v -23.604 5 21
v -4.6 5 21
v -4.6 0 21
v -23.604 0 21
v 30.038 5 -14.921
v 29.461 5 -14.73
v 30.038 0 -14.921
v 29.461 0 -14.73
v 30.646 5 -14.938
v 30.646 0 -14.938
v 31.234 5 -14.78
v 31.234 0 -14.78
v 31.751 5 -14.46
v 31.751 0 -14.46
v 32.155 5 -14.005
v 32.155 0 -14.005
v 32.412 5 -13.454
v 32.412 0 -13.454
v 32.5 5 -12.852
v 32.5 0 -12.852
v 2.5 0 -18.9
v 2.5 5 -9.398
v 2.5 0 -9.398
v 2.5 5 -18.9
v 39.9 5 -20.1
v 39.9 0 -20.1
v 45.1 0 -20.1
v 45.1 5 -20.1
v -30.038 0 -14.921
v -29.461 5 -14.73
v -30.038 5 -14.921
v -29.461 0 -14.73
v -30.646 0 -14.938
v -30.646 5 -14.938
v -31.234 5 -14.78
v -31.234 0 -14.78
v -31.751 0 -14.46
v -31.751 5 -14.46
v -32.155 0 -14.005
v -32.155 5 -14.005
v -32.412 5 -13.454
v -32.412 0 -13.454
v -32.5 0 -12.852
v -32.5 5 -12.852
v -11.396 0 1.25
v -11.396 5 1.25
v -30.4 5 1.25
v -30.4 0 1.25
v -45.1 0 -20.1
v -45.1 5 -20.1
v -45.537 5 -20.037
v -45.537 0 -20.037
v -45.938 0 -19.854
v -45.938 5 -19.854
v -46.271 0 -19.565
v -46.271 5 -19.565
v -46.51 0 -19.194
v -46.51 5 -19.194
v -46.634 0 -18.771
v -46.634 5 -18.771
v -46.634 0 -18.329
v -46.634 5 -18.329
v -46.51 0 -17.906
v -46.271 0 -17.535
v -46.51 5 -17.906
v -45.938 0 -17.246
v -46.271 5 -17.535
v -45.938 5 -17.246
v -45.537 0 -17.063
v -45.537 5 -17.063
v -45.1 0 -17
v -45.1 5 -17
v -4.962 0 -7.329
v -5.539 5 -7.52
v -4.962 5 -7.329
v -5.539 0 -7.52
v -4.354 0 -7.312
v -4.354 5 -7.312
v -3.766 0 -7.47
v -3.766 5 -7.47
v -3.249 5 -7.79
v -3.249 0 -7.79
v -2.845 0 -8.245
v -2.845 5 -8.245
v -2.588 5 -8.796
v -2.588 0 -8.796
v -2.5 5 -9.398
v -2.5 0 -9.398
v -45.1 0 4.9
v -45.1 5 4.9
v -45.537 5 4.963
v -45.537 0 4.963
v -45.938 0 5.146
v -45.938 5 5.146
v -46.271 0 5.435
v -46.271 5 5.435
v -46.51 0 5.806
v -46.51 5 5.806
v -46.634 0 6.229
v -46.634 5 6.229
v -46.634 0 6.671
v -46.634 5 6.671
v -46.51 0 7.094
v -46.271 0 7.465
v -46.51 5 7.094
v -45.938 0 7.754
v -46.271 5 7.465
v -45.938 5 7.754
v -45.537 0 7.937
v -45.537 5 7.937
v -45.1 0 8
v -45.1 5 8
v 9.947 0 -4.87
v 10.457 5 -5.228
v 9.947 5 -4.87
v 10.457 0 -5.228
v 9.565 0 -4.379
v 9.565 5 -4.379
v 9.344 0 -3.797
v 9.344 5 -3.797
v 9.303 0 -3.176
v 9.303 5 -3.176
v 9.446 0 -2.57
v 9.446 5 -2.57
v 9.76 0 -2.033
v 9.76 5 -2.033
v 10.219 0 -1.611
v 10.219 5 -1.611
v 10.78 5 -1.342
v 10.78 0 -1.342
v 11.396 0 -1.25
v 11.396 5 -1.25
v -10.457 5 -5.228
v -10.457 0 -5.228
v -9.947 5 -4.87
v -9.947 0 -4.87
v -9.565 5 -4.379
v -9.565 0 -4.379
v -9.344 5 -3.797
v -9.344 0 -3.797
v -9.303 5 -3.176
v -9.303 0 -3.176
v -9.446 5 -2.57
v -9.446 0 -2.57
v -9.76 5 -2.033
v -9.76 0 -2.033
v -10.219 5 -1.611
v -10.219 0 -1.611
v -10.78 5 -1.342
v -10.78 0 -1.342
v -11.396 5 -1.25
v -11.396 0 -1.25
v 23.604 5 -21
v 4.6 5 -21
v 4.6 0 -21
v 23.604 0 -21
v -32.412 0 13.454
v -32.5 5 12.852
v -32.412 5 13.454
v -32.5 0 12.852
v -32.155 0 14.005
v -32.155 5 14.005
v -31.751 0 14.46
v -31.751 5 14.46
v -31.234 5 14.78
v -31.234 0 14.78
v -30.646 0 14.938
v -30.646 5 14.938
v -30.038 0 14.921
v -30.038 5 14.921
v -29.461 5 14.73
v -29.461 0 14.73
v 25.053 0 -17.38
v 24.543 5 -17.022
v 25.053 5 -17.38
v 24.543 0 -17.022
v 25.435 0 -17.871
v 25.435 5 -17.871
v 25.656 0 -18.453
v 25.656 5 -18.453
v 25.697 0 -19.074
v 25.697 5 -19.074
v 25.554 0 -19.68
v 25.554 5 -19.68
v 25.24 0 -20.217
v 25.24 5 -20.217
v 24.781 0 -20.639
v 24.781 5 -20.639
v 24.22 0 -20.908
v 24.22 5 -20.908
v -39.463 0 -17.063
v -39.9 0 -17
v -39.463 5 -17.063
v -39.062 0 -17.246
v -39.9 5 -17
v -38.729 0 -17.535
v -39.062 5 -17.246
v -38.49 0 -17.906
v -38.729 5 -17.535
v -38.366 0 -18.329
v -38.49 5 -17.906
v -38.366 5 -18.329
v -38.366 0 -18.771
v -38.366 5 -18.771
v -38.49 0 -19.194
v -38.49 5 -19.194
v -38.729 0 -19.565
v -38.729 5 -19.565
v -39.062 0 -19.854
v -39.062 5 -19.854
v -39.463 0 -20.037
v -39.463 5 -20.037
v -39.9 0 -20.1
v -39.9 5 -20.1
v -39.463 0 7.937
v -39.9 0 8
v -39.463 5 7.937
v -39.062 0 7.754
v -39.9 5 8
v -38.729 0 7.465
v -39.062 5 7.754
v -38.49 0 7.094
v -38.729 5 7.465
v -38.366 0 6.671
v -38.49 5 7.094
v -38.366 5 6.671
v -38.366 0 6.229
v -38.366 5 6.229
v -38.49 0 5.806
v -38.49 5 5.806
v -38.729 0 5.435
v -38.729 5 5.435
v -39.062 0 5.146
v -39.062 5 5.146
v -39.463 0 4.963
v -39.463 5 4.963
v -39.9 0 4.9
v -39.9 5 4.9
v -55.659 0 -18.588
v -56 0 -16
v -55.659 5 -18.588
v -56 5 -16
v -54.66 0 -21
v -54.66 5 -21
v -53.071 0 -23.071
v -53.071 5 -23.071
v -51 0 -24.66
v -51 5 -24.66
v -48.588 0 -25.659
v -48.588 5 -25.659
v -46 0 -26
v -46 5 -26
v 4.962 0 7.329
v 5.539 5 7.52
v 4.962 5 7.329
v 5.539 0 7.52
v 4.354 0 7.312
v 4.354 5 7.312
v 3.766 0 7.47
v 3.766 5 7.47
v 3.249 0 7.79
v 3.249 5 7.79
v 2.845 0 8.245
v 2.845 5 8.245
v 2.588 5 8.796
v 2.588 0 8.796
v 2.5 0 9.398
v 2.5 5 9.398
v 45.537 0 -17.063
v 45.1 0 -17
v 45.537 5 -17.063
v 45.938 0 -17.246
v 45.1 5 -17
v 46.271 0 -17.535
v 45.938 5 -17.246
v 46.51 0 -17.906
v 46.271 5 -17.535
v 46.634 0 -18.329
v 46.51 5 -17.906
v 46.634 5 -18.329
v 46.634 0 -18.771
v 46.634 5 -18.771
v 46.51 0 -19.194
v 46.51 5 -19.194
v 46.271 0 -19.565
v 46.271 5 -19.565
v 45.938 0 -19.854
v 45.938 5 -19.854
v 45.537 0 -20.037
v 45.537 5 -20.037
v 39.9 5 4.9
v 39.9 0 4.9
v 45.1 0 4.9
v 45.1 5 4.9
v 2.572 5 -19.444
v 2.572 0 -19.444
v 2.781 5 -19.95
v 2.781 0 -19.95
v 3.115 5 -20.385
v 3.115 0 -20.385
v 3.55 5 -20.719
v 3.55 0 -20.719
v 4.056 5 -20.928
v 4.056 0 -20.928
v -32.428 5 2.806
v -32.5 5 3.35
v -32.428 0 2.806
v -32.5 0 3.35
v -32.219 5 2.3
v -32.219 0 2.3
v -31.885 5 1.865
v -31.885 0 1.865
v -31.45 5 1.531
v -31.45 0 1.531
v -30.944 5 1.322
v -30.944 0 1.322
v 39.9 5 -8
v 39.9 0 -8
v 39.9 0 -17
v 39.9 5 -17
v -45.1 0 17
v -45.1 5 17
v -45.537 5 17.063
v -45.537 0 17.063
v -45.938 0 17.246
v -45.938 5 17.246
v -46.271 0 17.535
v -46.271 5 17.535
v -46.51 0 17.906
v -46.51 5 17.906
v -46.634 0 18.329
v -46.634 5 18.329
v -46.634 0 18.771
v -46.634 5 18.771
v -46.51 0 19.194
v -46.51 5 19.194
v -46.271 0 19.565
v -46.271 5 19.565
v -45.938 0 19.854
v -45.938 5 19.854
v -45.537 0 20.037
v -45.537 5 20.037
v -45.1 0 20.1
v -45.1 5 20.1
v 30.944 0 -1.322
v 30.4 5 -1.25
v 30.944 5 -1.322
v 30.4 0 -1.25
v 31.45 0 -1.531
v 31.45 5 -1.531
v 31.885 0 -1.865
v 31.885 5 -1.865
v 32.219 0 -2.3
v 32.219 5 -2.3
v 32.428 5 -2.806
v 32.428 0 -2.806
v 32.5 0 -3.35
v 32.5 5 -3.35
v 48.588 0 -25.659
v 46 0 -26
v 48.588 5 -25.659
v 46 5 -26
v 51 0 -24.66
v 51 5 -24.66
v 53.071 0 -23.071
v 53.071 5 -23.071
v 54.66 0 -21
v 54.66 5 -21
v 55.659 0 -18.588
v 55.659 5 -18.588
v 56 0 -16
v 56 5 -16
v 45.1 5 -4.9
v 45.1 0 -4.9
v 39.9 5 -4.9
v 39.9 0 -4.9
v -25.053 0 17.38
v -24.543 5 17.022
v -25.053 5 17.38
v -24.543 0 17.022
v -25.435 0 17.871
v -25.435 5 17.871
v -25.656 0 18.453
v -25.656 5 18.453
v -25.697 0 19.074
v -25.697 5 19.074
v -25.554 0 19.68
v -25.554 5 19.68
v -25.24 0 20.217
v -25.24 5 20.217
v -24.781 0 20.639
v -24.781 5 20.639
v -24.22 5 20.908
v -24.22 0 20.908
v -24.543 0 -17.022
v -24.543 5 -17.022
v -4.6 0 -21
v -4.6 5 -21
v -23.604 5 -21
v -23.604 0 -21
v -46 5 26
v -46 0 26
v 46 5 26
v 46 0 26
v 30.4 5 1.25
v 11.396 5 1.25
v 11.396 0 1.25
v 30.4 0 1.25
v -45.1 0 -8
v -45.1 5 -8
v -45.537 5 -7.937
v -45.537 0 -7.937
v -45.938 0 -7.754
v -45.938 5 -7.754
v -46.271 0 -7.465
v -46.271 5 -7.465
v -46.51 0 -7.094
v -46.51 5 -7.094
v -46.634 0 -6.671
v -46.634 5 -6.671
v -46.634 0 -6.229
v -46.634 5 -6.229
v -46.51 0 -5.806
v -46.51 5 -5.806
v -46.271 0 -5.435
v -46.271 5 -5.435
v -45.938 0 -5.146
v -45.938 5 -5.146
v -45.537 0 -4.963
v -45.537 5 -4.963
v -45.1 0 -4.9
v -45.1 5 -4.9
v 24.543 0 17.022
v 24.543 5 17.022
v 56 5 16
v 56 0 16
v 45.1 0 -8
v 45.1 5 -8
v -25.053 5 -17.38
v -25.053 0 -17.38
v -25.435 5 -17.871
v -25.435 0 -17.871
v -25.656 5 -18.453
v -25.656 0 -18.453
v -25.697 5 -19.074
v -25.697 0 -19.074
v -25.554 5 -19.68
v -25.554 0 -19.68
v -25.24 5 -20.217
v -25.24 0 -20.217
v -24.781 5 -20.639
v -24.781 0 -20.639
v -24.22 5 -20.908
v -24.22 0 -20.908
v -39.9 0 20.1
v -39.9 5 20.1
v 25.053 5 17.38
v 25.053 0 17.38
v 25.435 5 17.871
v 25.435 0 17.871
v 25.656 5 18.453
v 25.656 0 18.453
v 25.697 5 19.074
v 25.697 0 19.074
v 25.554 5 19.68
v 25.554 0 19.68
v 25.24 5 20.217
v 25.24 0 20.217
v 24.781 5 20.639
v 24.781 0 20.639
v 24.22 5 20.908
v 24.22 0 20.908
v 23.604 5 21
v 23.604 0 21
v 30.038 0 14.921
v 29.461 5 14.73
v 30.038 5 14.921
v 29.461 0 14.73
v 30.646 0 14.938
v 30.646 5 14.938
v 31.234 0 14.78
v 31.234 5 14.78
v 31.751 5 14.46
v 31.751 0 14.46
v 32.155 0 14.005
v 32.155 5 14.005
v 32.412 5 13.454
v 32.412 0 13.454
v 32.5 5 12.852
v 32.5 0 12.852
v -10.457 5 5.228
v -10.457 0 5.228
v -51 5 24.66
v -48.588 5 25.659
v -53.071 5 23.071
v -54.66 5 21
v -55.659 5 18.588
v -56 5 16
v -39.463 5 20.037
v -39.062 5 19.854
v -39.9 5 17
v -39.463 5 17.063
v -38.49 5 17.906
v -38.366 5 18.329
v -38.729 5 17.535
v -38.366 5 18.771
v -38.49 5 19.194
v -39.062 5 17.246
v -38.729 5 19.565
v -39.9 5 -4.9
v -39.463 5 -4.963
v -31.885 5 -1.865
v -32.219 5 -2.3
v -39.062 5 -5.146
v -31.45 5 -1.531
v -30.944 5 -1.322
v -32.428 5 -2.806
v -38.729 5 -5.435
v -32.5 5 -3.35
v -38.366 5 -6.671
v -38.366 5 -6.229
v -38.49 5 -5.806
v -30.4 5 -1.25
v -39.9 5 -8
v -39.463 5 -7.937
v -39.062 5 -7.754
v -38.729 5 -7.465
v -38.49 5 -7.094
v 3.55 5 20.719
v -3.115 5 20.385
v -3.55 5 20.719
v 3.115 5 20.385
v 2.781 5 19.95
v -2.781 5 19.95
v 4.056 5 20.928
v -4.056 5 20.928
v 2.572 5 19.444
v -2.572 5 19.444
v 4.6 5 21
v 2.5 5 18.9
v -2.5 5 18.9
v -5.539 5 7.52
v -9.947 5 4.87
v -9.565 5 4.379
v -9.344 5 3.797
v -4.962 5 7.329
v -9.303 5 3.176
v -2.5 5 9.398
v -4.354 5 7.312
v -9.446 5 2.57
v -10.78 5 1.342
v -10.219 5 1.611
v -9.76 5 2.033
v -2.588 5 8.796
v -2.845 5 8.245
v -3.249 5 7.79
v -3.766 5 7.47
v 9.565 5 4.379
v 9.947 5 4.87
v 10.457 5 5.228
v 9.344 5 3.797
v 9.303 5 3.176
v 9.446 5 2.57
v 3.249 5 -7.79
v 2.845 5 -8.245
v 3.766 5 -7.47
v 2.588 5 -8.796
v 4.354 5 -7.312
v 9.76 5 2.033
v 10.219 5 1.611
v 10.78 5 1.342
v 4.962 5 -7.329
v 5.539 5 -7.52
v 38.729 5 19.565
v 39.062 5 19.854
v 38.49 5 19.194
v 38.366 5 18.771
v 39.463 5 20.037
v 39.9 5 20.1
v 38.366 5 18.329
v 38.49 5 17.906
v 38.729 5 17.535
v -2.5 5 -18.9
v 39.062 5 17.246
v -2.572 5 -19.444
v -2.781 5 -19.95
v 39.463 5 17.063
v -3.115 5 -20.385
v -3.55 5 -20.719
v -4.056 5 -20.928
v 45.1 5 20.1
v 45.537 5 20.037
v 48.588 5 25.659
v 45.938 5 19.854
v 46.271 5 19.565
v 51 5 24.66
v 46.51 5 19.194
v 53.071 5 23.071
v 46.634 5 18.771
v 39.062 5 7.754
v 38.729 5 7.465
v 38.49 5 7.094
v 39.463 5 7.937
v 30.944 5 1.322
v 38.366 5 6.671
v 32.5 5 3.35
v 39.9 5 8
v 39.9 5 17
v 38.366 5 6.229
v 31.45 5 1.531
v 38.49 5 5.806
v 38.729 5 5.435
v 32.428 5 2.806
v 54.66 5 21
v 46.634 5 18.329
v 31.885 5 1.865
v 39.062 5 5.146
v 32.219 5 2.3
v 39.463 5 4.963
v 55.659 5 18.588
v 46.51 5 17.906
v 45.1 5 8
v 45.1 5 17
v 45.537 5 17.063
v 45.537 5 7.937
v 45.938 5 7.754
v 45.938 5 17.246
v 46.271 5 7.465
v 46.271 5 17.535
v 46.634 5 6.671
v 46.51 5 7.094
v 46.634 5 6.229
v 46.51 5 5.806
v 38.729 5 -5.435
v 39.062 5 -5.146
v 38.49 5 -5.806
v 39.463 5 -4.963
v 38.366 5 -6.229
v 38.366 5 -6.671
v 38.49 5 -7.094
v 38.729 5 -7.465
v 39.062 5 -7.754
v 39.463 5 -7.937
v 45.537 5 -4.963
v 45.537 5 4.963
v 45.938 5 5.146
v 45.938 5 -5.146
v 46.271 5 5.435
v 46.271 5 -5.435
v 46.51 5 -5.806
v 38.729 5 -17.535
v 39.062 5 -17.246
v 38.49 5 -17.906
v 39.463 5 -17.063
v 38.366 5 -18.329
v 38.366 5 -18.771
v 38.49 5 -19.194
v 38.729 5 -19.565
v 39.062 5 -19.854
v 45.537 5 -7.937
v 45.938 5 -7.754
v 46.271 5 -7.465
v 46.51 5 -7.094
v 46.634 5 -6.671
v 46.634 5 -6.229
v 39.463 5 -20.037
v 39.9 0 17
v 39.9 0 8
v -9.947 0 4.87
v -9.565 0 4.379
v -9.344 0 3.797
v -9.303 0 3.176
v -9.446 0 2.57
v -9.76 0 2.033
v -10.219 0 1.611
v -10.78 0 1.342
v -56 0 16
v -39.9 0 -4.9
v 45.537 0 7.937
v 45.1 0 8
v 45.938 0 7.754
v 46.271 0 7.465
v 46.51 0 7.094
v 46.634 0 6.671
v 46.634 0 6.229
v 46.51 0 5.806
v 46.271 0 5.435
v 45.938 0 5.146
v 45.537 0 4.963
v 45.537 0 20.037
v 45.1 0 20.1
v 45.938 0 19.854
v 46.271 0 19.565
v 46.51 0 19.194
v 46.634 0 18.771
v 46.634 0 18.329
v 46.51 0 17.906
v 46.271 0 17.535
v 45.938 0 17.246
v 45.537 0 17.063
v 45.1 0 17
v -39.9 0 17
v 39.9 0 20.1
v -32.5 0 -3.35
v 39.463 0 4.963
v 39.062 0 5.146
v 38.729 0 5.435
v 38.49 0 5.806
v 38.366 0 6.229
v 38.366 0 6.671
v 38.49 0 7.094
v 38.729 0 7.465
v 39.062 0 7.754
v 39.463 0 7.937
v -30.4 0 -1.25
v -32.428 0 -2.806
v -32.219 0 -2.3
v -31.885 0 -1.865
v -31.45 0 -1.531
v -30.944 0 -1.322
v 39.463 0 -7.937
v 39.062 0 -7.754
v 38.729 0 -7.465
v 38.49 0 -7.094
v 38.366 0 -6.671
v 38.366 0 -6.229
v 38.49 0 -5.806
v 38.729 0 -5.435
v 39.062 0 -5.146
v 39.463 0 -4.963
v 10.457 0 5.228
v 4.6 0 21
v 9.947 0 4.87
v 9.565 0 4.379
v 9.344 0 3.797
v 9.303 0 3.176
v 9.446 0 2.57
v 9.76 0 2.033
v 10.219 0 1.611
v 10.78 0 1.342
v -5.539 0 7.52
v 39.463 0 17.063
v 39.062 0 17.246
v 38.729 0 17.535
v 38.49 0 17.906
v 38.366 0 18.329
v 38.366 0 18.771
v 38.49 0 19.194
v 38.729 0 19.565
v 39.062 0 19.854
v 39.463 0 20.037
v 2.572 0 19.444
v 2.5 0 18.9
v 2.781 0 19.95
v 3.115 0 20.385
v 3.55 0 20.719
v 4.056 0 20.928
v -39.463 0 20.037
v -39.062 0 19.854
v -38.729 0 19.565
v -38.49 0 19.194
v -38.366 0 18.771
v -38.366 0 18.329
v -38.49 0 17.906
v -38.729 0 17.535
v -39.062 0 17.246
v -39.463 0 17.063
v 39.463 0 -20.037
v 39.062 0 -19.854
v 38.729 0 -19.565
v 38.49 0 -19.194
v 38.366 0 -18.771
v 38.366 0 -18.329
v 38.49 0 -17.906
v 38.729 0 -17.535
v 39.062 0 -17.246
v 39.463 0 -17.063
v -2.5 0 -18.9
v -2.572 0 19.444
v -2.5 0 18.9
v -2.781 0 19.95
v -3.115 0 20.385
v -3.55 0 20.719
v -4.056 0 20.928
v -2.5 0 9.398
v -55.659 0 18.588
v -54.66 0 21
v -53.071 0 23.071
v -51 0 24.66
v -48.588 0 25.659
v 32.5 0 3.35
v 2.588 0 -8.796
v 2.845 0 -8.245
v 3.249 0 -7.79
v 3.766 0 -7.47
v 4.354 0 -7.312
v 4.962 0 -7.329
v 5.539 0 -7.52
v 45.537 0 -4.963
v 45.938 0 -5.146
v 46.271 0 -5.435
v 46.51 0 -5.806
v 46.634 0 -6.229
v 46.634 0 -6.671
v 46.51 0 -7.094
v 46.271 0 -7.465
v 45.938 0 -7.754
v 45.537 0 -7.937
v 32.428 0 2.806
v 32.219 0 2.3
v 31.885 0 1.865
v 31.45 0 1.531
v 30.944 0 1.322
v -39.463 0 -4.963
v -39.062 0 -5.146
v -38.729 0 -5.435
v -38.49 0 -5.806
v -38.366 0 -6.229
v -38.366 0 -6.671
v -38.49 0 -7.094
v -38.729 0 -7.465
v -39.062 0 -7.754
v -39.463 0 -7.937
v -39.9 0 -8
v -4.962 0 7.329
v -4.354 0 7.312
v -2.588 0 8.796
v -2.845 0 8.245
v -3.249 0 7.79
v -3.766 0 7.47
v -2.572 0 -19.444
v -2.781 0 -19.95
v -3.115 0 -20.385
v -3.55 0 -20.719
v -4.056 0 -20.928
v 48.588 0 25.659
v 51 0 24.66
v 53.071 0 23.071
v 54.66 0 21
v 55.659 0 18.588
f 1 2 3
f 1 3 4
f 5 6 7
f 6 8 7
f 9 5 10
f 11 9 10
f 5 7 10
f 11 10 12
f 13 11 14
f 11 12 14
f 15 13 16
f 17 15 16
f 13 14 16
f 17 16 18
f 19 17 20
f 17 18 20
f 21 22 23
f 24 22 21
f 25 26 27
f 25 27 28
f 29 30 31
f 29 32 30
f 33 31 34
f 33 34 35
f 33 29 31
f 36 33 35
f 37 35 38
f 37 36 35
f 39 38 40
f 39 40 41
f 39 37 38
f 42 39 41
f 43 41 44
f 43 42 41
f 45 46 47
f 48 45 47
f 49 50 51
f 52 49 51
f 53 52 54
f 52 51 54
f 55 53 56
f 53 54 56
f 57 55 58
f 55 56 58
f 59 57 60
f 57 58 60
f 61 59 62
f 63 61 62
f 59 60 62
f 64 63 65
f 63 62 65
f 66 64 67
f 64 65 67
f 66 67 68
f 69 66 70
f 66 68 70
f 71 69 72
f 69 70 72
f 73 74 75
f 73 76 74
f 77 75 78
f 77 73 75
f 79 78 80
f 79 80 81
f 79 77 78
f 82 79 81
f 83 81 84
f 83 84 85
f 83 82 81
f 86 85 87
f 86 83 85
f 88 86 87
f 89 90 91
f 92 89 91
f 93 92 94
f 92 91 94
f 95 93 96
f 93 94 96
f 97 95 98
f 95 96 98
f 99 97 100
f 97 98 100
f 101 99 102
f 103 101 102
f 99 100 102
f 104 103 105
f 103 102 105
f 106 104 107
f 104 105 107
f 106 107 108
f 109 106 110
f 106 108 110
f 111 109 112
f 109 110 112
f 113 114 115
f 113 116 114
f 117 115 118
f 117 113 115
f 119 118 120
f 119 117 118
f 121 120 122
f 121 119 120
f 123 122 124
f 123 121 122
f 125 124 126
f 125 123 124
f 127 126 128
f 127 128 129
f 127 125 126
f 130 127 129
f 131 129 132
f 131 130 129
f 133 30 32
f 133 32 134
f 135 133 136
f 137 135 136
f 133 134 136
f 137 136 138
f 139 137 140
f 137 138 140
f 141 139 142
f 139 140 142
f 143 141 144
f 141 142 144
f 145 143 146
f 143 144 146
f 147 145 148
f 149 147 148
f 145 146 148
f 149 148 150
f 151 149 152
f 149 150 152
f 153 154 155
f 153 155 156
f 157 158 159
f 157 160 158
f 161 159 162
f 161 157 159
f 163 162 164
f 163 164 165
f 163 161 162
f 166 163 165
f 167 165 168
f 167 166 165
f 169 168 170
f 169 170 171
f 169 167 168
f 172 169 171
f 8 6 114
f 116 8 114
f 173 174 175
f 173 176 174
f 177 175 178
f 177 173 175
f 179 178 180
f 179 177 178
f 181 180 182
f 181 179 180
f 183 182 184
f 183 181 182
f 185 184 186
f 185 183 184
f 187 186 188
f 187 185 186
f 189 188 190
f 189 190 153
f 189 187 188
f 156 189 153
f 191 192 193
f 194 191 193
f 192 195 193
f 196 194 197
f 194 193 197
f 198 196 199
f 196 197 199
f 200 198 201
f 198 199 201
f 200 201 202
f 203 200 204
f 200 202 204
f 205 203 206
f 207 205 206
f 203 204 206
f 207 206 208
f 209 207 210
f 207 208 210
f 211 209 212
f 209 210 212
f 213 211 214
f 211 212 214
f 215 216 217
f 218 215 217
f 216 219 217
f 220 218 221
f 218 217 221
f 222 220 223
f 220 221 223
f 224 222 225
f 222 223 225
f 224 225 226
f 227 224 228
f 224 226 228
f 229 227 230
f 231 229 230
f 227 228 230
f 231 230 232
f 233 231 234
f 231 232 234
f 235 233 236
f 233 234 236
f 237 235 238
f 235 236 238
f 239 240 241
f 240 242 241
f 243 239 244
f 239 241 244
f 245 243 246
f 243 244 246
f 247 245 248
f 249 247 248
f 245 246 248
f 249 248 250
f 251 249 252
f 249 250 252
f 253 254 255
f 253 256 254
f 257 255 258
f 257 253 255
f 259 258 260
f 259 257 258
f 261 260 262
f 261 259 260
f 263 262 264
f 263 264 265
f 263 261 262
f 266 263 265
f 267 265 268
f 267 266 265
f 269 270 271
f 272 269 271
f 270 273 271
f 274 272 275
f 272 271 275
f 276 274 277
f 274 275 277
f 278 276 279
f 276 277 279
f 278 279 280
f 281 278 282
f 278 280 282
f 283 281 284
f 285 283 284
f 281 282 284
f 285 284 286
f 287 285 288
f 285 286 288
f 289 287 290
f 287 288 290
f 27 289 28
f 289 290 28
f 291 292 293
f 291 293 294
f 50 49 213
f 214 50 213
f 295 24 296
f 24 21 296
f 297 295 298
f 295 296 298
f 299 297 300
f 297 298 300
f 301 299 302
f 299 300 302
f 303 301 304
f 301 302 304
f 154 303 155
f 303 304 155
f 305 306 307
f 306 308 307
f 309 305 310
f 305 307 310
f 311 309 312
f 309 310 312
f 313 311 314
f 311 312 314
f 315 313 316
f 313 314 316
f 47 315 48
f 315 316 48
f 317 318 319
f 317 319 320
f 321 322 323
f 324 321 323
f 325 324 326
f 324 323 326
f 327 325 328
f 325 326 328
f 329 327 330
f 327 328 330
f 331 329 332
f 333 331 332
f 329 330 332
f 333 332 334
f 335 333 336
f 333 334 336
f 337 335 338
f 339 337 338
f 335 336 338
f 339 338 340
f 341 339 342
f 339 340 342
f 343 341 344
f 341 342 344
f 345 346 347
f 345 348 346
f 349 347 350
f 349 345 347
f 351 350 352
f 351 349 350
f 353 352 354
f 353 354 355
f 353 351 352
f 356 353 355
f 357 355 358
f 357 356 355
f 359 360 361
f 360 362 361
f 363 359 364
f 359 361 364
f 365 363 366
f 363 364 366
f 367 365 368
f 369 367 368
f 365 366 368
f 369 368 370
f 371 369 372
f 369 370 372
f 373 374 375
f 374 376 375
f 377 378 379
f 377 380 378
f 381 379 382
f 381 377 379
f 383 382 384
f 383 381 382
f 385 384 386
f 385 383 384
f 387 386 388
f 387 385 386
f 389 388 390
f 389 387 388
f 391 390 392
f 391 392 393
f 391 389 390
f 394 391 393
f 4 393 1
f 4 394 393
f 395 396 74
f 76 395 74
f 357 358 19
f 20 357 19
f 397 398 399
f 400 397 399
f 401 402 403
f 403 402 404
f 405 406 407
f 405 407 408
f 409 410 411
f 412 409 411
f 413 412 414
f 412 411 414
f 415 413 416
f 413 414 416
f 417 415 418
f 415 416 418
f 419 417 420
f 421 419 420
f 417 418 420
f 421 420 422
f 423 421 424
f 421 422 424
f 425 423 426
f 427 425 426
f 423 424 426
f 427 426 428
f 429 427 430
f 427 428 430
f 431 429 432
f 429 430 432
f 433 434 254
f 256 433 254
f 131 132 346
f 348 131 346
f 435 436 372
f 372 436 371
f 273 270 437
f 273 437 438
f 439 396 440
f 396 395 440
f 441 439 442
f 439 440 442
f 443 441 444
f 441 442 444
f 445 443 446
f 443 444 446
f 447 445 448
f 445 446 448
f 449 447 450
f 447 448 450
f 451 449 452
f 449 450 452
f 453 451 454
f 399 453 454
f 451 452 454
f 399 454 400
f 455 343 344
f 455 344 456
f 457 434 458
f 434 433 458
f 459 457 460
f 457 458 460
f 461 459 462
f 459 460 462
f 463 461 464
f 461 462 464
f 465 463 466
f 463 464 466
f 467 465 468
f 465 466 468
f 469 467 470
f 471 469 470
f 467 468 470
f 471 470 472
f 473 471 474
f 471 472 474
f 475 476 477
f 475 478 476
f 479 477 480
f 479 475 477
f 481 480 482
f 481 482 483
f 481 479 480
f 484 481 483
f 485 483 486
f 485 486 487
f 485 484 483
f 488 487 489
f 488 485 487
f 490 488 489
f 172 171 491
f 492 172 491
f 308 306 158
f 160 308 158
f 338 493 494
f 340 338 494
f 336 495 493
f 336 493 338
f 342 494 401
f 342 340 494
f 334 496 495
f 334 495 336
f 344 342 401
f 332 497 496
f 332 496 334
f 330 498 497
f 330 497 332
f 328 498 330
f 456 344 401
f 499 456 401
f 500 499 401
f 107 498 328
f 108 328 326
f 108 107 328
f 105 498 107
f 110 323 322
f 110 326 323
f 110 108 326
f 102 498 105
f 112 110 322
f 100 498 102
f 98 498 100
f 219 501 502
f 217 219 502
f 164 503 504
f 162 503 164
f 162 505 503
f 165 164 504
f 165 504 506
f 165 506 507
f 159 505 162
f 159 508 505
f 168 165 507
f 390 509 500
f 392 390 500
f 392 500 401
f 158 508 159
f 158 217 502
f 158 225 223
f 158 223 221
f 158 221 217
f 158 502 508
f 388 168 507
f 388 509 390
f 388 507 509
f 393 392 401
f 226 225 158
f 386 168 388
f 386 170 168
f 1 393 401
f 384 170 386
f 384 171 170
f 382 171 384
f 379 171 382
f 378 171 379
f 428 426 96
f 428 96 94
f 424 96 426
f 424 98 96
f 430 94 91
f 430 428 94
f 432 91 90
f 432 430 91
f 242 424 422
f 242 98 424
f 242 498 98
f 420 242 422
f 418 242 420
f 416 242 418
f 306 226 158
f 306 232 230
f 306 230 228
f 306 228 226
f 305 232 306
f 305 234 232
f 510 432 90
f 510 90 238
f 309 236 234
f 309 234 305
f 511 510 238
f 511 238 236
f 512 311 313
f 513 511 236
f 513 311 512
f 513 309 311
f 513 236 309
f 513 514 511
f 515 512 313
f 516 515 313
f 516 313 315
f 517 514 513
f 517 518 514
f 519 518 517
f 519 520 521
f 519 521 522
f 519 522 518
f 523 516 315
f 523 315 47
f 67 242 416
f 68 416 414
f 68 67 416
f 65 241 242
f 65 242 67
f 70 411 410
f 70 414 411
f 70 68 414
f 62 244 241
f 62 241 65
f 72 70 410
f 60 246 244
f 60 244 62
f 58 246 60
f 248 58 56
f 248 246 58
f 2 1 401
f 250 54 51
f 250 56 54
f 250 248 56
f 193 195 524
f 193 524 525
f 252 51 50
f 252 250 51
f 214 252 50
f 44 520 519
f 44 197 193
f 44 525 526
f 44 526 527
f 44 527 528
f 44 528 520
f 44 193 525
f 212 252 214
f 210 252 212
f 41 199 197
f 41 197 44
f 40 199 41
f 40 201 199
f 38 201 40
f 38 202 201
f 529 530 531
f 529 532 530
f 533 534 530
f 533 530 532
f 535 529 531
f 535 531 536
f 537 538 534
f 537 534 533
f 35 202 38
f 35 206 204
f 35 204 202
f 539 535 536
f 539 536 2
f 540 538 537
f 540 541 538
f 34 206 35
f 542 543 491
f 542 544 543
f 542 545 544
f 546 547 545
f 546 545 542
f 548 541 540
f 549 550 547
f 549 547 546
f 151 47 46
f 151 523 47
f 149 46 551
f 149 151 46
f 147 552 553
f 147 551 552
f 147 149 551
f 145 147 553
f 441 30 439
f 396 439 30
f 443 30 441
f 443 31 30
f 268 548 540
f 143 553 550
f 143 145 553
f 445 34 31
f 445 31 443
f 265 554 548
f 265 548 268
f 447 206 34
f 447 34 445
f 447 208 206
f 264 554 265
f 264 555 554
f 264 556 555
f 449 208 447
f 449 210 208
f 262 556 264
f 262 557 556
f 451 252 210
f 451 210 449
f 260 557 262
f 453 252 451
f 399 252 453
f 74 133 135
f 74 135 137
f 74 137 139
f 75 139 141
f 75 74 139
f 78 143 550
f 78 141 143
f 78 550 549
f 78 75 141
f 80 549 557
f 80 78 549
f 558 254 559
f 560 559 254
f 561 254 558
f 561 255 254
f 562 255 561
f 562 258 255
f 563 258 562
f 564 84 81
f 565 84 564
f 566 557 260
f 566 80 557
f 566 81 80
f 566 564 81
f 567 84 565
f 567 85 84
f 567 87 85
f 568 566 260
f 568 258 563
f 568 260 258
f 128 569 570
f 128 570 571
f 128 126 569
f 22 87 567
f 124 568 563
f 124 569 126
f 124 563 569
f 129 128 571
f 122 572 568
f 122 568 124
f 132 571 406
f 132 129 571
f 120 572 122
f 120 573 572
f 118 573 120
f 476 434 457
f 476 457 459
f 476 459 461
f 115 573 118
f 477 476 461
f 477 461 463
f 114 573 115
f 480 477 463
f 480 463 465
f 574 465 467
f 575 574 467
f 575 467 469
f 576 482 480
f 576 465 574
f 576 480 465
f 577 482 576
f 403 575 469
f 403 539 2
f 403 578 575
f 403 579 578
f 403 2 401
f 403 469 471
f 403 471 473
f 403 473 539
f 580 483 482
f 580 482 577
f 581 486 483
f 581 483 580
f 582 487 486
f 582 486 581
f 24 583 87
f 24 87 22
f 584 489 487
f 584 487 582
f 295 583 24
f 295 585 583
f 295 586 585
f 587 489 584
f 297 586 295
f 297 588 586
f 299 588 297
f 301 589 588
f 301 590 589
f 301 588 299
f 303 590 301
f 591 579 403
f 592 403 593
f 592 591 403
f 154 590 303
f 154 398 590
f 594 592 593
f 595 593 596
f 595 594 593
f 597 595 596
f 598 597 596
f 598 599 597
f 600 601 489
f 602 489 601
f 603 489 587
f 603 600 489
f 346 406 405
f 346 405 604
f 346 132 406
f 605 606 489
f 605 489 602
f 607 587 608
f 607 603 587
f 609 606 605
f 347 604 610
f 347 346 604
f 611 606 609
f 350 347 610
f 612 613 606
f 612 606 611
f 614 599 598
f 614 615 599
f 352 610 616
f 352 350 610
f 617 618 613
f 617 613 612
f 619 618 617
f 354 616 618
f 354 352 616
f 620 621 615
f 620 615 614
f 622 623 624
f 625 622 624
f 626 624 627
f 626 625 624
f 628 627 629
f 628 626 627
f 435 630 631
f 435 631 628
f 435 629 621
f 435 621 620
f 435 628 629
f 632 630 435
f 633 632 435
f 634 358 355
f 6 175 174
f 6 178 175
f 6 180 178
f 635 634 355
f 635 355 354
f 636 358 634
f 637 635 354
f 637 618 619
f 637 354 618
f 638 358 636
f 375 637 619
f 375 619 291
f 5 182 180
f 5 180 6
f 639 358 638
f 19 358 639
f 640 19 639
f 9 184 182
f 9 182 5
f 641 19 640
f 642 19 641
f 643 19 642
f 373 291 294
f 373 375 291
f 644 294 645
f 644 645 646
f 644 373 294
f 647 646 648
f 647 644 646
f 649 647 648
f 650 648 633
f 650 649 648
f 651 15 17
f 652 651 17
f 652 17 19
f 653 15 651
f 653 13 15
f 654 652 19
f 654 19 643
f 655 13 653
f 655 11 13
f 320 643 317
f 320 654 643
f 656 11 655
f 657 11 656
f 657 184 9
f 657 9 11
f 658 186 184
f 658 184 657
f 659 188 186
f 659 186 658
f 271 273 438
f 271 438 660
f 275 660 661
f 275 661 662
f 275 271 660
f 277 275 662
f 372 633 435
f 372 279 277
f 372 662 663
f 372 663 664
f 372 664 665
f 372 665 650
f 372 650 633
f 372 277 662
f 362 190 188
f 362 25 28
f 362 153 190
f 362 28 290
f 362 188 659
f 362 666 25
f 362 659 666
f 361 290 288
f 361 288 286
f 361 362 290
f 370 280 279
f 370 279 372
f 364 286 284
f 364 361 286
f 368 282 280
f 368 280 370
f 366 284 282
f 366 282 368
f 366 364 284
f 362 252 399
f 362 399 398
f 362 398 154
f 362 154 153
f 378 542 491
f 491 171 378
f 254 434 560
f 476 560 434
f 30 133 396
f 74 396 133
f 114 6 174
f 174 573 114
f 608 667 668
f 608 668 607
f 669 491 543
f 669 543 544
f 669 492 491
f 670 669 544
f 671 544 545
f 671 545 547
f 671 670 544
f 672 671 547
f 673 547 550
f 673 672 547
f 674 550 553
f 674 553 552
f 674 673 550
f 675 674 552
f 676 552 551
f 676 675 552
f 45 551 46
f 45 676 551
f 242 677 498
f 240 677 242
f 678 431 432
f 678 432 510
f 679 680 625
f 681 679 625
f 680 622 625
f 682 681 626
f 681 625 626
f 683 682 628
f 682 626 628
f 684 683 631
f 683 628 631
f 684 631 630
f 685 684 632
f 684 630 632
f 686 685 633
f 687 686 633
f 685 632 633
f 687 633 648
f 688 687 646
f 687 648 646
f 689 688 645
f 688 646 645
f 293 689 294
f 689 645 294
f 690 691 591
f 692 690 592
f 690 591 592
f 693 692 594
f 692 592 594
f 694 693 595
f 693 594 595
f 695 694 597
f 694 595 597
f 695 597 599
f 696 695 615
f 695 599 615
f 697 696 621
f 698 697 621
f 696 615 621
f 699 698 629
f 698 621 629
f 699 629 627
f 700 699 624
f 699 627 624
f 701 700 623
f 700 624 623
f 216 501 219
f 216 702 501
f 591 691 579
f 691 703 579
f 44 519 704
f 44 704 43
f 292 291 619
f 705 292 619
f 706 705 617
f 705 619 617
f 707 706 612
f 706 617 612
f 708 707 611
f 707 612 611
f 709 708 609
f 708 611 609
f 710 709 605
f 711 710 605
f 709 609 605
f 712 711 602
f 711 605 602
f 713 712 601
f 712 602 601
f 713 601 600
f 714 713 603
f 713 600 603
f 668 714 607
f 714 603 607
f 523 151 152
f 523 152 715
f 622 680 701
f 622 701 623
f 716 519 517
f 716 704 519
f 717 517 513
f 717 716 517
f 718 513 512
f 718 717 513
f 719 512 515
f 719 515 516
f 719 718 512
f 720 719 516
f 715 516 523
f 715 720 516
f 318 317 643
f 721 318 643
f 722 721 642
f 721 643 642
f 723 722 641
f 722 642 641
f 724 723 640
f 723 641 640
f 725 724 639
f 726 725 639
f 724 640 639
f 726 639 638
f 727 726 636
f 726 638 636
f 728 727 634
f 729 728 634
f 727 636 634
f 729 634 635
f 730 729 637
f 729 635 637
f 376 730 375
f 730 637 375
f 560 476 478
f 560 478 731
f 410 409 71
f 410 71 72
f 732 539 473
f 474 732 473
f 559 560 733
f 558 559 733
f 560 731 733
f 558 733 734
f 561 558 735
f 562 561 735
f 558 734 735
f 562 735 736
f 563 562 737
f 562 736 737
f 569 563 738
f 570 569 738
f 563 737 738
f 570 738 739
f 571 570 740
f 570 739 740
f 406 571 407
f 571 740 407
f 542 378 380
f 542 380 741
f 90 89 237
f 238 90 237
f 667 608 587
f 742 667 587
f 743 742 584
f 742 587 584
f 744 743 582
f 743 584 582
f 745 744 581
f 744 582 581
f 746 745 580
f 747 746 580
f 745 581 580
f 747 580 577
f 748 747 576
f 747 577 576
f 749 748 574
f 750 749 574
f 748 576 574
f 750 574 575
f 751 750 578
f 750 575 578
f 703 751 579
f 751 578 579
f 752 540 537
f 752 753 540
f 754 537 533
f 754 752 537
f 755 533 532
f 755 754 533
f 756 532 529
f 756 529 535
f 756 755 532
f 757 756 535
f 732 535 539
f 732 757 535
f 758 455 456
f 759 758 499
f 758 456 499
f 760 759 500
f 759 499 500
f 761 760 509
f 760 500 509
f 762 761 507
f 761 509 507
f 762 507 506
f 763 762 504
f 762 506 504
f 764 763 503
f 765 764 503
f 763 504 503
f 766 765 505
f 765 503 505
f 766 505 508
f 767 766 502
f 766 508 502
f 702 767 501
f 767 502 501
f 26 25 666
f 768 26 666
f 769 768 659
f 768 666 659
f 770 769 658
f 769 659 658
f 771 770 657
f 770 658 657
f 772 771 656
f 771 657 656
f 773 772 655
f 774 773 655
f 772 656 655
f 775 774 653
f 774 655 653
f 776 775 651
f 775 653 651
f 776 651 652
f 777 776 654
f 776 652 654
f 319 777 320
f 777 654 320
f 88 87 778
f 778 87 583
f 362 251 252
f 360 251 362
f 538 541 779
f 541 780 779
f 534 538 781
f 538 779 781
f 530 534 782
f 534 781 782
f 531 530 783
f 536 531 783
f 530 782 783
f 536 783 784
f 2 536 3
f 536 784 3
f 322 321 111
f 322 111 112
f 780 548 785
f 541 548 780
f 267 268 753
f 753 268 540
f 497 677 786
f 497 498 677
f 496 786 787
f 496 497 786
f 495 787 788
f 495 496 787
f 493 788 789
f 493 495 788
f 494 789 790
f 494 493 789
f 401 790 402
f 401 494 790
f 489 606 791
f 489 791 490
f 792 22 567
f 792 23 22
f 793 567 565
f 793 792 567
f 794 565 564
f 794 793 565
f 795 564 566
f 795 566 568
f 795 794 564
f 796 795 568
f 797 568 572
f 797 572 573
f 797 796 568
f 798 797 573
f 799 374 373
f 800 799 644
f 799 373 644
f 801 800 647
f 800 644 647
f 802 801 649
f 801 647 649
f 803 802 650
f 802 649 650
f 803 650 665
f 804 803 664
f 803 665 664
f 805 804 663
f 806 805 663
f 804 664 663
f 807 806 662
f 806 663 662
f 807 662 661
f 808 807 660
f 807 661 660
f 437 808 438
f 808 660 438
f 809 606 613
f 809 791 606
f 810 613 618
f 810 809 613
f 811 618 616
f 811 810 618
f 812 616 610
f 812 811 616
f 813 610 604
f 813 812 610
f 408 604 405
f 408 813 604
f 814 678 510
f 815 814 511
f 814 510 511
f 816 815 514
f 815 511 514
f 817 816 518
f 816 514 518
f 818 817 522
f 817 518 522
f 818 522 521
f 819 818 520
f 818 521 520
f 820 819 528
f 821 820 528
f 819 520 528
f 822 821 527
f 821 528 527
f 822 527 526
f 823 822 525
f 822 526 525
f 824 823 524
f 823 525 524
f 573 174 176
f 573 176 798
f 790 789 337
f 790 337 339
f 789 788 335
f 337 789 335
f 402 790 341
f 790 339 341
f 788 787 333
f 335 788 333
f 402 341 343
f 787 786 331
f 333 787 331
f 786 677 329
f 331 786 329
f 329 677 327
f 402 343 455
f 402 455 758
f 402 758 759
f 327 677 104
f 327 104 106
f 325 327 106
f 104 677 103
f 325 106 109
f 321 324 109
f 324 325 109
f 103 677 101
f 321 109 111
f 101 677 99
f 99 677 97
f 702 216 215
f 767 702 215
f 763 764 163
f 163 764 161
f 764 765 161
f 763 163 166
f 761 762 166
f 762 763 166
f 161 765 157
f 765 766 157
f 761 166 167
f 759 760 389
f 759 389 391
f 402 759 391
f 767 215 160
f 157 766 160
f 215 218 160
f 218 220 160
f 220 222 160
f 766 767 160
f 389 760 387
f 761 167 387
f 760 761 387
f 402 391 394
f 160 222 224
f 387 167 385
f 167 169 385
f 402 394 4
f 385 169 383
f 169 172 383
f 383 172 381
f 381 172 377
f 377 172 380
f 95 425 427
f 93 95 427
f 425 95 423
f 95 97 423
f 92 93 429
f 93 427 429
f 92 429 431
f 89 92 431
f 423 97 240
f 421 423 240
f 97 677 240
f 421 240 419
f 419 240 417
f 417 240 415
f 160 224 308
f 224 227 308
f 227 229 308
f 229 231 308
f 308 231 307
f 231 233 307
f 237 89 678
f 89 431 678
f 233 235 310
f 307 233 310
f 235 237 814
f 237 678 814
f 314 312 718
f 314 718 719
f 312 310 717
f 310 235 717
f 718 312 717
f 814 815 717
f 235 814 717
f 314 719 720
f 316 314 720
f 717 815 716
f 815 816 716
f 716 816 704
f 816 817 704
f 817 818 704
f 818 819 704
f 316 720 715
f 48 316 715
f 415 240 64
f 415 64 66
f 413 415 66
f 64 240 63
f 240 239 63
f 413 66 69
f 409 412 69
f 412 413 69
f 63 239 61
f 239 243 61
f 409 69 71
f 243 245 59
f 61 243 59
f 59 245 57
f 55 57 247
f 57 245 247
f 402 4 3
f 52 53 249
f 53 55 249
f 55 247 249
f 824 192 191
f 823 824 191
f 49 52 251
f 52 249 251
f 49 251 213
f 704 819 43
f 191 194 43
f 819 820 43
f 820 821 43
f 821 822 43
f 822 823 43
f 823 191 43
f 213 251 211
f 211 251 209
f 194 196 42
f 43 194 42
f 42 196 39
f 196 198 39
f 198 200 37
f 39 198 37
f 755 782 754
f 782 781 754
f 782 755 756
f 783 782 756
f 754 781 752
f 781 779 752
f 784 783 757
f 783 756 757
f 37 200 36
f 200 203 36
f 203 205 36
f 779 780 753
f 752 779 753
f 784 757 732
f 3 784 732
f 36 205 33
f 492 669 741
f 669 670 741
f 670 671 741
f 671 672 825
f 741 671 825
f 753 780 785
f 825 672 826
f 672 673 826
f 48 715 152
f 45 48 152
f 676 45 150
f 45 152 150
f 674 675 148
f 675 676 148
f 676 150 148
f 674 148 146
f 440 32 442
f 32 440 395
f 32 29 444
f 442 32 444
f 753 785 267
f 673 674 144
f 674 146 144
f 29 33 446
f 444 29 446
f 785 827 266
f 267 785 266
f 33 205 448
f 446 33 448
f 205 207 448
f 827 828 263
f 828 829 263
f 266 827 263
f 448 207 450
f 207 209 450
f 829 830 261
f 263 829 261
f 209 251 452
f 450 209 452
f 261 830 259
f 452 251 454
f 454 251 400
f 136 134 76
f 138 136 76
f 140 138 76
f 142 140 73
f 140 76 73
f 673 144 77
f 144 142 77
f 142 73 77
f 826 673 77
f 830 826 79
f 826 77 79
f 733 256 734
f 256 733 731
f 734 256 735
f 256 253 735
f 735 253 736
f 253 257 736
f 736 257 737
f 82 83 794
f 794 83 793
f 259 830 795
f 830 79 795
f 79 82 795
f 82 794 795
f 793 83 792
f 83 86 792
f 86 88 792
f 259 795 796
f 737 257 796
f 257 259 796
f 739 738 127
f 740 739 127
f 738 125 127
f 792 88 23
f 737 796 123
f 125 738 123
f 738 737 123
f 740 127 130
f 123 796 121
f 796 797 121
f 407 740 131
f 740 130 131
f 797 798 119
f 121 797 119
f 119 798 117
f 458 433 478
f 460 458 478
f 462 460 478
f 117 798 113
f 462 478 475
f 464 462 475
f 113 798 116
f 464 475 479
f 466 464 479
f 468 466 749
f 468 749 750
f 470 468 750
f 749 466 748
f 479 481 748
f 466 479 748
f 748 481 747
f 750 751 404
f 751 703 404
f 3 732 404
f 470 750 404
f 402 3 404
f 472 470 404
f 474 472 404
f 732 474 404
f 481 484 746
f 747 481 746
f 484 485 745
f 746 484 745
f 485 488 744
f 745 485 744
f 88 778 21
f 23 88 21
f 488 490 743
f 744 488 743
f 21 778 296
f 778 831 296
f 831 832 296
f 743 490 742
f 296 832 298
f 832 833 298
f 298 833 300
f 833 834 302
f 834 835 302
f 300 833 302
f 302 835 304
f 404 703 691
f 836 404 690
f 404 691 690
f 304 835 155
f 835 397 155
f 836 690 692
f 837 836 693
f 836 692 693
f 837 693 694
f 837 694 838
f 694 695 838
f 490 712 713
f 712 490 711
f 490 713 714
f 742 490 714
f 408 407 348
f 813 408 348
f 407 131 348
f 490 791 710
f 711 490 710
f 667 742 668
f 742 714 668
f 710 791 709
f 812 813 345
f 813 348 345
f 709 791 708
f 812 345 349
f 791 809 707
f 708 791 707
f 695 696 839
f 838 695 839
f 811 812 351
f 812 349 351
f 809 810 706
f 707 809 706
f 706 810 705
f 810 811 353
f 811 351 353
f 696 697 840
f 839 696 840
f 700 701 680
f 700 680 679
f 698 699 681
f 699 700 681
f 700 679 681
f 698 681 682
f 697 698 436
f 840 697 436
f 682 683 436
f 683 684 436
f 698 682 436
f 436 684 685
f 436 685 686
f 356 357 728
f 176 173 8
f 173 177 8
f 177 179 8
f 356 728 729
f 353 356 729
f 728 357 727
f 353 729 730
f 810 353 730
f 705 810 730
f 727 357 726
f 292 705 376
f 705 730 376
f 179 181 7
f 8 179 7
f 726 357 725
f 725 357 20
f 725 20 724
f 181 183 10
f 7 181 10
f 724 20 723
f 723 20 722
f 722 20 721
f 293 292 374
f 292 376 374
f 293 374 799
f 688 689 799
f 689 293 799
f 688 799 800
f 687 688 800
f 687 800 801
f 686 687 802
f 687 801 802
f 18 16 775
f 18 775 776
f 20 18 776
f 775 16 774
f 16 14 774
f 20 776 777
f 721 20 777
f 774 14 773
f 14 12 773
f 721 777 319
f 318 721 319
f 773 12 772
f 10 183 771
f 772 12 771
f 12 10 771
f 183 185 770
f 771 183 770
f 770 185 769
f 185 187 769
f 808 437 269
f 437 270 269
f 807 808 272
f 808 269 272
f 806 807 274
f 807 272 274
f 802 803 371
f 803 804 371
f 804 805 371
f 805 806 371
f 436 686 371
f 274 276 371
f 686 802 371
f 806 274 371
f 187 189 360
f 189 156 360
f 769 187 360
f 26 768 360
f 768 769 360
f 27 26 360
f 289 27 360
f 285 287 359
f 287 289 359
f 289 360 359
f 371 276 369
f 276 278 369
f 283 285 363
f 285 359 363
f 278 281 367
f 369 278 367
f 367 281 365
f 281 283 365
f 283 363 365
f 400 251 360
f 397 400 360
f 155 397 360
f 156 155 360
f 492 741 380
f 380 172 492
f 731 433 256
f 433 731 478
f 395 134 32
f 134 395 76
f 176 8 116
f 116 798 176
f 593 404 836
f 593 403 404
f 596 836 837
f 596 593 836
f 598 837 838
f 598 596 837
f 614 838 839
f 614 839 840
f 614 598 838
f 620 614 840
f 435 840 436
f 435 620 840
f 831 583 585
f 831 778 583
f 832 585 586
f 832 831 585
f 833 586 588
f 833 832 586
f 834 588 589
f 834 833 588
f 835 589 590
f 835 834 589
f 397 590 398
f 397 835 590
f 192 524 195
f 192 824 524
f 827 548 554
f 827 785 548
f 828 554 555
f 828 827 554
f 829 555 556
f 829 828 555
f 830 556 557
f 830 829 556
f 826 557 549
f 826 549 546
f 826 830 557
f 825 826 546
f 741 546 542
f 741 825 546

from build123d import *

# Parameters (mm, degrees)
SKETCH_1_W          = 112
SKETCH_1_H          = 52
SKETCH_1_W_2        = 5
SKETCH_1_H_2        = 15
EXTRUDE_1_DEPTH     = 5
MOVE_FACE_1_BY      = 0.1
MOVE_FACE_1_2_BY    = 0.1
MOVE_FACE_1_3_BY    = 0.1
MOVE_FACE_1_4_BY    = 0.1
MOVE_FACE_1_5_BY    = 0.1
MOVE_FACE_1_6_BY    = 0.1
MOVE_FACE_1_7_BY    = 0.1
MOVE_FACE_1_8_BY    = 0.1
MOVE_FACE_1_9_BY    = 0.1
MOVE_FACE_1_10_BY   = 0.1
MOVE_FACE_1_11_BY   = 0.1
MOVE_FACE_1_12_BY   = 0.1
MOVE_FACE_1_13_BY   = 0.1
MOVE_FACE_1_14_BY   = 0.1
MOVE_FACE_1_15_BY   = 0.1
MOVE_FACE_1_16_BY   = 0.1
SKETCH_2_R          = 1.55
CUT_EXTRUDE_1_DEPTH = 5
CUT_EXTRUDE_2_DEPTH = 5
FILLET_1_R          = 2.1
FILLET_2_R          = 10


with BuildPart() as part:
    # 草图1 → 凸台-拉伸1 (new body)
    with BuildSketch(Plane(origin=(0, 0, 0), x_dir=(1, 0, 0), z_dir=(0, 1, 0))):
        Rectangle(SKETCH_1_W, SKETCH_1_H)
        with Locations((42.5, -12.5)):
            Rectangle(SKETCH_1_W_2, SKETCH_1_H_2, mode=Mode.SUBTRACT)
        with Locations((42.5, 12.5)):
            Rectangle(SKETCH_1_W_2, SKETCH_1_H_2, mode=Mode.SUBTRACT)
        with Locations((-42.5, -12.5)):
            Rectangle(SKETCH_1_W_2, SKETCH_1_H_2, mode=Mode.SUBTRACT)
        with Locations((-42.5, 12.5)):
            Rectangle(SKETCH_1_W_2, SKETCH_1_H_2, mode=Mode.SUBTRACT)
    extrude(amount=EXTRUDE_1_DEPTH)

    # Move Face 1: a face moved inward by 0.1
    extrude(part.faces().sort_by_distance((-45, 2.5, -12.5))[0], amount=MOVE_FACE_1_BY, dir=(-1, 0, 0), mode=Mode.SUBTRACT)

    # Move Face 1 2: a face moved inward by 0.1
    extrude(part.faces().sort_by_distance((-42.5, 2.5, -20))[0], amount=MOVE_FACE_1_2_BY, dir=(0, 0, -1), mode=Mode.SUBTRACT)

    # Move Face 1 3: a face moved inward by 0.1
    extrude(part.faces().sort_by_distance((-45, 2.5, 12.5))[0], amount=MOVE_FACE_1_3_BY, dir=(-1, 0, 0), mode=Mode.SUBTRACT)

    # Move Face 1 4: a face moved inward by 0.1
    extrude(part.faces().sort_by_distance((-42.5, 2.5, 5))[0], amount=MOVE_FACE_1_4_BY, dir=(0, 0, -1), mode=Mode.SUBTRACT)

    # Move Face 1 5: a face moved inward by 0.1
    extrude(part.faces().sort_by_distance((-42.5, 2.5, 20))[0], amount=MOVE_FACE_1_5_BY, dir=(0, 0, 1), mode=Mode.SUBTRACT)

    # Move Face 1 6: a face moved inward by 0.1
    extrude(part.faces().sort_by_distance((-40, 2.5, 12.5))[0], amount=MOVE_FACE_1_6_BY, dir=(1, 0, 0), mode=Mode.SUBTRACT)

    # Move Face 1 7: a face moved inward by 0.1
    extrude(part.faces().sort_by_distance((-42.5, 2.5, -5))[0], amount=MOVE_FACE_1_7_BY, dir=(0, 0, 1), mode=Mode.SUBTRACT)

    # Move Face 1 8: a face moved inward by 0.1
    extrude(part.faces().sort_by_distance((-40, 2.5, -12.5))[0], amount=MOVE_FACE_1_8_BY, dir=(1, 0, 0), mode=Mode.SUBTRACT)

    # Move Face 1 9: a face moved inward by 0.1
    extrude(part.faces().sort_by_distance((42.5, 2.5, 20))[0], amount=MOVE_FACE_1_9_BY, dir=(0, 0, 1), mode=Mode.SUBTRACT)

    # Move Face 1 10: a face moved inward by 0.1
    extrude(part.faces().sort_by_distance((40, 2.5, 12.5))[0], amount=MOVE_FACE_1_10_BY, dir=(-1, 0, 0), mode=Mode.SUBTRACT)

    # Move Face 1 11: a face moved inward by 0.1
    extrude(part.faces().sort_by_distance((45, 2.5, 12.5))[0], amount=MOVE_FACE_1_11_BY, dir=(1, 0, 0), mode=Mode.SUBTRACT)

    # Move Face 1 12: a face moved inward by 0.1
    extrude(part.faces().sort_by_distance((42.5, 2.5, 5))[0], amount=MOVE_FACE_1_12_BY, dir=(0, 0, -1), mode=Mode.SUBTRACT)

    # Move Face 1 13: a face moved inward by 0.1
    extrude(part.faces().sort_by_distance((42.5, 2.5, -5))[0], amount=MOVE_FACE_1_13_BY, dir=(0, 0, 1), mode=Mode.SUBTRACT)

    # Move Face 1 14: a face moved inward by 0.1
    extrude(part.faces().sort_by_distance((40, 2.5, -12.5))[0], amount=MOVE_FACE_1_14_BY, dir=(-1, 0, 0), mode=Mode.SUBTRACT)

    # Move Face 1 15: a face moved inward by 0.1
    extrude(part.faces().sort_by_distance((42.5, 2.5, -20))[0], amount=MOVE_FACE_1_15_BY, dir=(0, 0, -1), mode=Mode.SUBTRACT)

    # Move Face 1 16: a face moved inward by 0.1
    extrude(part.faces().sort_by_distance((45, 2.5, -12.5))[0], amount=MOVE_FACE_1_16_BY, dir=(1, 0, 0), mode=Mode.SUBTRACT)

    # 草图2 → 切除-拉伸1 (cut)
    with BuildSketch(Plane(origin=(0, 5, 0), x_dir=(1, 0, 0), z_dir=(0, 1, 0))):
        with Locations((45.1, 18.55)):
            Circle(SKETCH_2_R)
        with Locations((45.1, 6.45)):
            Circle(SKETCH_2_R)
        with Locations((45.1, -6.45)):
            Circle(SKETCH_2_R)
        with Locations((45.1, -18.55)):
            Circle(SKETCH_2_R)
        with Locations((39.9, -18.55)):
            Circle(SKETCH_2_R)
        with Locations((39.9, -6.45)):
            Circle(SKETCH_2_R)
        with Locations((39.9, 6.45)):
            Circle(SKETCH_2_R)
        with Locations((39.9, 18.55)):
            Circle(SKETCH_2_R)
        with Locations((-39.9, 18.55)):
            Circle(SKETCH_2_R)
        with Locations((-39.9, 6.45)):
            Circle(SKETCH_2_R)
        with Locations((-39.9, -6.45)):
            Circle(SKETCH_2_R)
        with Locations((-39.9, -18.55)):
            Circle(SKETCH_2_R)
        with Locations((-45.1, -18.55)):
            Circle(SKETCH_2_R)
        with Locations((-45.1, -6.45)):
            Circle(SKETCH_2_R)
        with Locations((-45.1, 6.45)):
            Circle(SKETCH_2_R)
        with Locations((-45.1, 18.55)):
            Circle(SKETCH_2_R)
    extrude(amount=-CUT_EXTRUDE_1_DEPTH, mode=Mode.SUBTRACT)

    # 草图3 → 切除-拉伸2 (cut)
    with BuildSketch(Plane(origin=(0, 5, 0), x_dir=(1, 0, 0), z_dir=(0, 1, 0))):
        Polygon((2.5, 21), (32.5, 21), (2.5, 6), align=None)
        Polygon((32.5, 16.25), (2.5, 1.25), (32.5, 1.25), align=None)
        Polygon((-2.5, 1.25), (-32.5, 1.25), (-32.5, 16.25), align=None)
        Polygon((-32.5, 21), (-2.5, 6), (-2.5, 21), align=None)
        Polygon((2.5, -1.25), (32.5, -1.25), (32.5, -16.25), align=None)
        Polygon((32.5, -21), (2.5, -6), (2.5, -21), align=None)
        Polygon((-32.5, -1.25), (-32.5, -16.25), (-2.5, -1.25), align=None)
        Polygon((-2.5, -21), (-32.5, -21), (-2.5, -6), align=None)
    extrude(amount=-CUT_EXTRUDE_2_DEPTH, mode=Mode.SUBTRACT)

    # 圆角1
    fillet_1_edges = [part.edges().sort_by_distance(p)[0] for p in [
        (32.5, 2.5, 16.25),
        (2.5, 2.5, 1.25),
        (32.5, 2.5, 1.25),
        (-32.5, 2.5, -21),
        (-2.5, 2.5, -21),
        (-2.5, 2.5, -6),
        (-32.5, 2.5, -16.25),
        (-2.5, 2.5, -1.25),
        (-32.5, 2.5, -1.25),
        (32.5, 2.5, -16.25),
        (32.5, 2.5, -1.25),
        (2.5, 2.5, -1.25),
        (-2.5, 2.5, 6),
        (-2.5, 2.5, 21),
        (-32.5, 2.5, 21),
        (-32.5, 2.5, 1.25),
        (-2.5, 2.5, 1.25),
        (-32.5, 2.5, 16.25),
        (32.5, 2.5, 21),
        (2.5, 2.5, 21),
        (2.5, 2.5, 6),
        (2.5, 2.5, -6),
        (2.5, 2.5, -21),
        (32.5, 2.5, -21),
    ]]
    fillet(fillet_1_edges, radius=FILLET_1_R)

    # 圆角2
    fillet_2_edges = [part.edges().sort_by_distance(p)[0] for p in [
        (-56, 2.5, -26),
        (56, 2.5, -26),
        (56, 2.5, 26),
        (-56, 2.5, 26),
    ]]
    fillet(fillet_2_edges, radius=FILLET_2_R)


solid = part.part
